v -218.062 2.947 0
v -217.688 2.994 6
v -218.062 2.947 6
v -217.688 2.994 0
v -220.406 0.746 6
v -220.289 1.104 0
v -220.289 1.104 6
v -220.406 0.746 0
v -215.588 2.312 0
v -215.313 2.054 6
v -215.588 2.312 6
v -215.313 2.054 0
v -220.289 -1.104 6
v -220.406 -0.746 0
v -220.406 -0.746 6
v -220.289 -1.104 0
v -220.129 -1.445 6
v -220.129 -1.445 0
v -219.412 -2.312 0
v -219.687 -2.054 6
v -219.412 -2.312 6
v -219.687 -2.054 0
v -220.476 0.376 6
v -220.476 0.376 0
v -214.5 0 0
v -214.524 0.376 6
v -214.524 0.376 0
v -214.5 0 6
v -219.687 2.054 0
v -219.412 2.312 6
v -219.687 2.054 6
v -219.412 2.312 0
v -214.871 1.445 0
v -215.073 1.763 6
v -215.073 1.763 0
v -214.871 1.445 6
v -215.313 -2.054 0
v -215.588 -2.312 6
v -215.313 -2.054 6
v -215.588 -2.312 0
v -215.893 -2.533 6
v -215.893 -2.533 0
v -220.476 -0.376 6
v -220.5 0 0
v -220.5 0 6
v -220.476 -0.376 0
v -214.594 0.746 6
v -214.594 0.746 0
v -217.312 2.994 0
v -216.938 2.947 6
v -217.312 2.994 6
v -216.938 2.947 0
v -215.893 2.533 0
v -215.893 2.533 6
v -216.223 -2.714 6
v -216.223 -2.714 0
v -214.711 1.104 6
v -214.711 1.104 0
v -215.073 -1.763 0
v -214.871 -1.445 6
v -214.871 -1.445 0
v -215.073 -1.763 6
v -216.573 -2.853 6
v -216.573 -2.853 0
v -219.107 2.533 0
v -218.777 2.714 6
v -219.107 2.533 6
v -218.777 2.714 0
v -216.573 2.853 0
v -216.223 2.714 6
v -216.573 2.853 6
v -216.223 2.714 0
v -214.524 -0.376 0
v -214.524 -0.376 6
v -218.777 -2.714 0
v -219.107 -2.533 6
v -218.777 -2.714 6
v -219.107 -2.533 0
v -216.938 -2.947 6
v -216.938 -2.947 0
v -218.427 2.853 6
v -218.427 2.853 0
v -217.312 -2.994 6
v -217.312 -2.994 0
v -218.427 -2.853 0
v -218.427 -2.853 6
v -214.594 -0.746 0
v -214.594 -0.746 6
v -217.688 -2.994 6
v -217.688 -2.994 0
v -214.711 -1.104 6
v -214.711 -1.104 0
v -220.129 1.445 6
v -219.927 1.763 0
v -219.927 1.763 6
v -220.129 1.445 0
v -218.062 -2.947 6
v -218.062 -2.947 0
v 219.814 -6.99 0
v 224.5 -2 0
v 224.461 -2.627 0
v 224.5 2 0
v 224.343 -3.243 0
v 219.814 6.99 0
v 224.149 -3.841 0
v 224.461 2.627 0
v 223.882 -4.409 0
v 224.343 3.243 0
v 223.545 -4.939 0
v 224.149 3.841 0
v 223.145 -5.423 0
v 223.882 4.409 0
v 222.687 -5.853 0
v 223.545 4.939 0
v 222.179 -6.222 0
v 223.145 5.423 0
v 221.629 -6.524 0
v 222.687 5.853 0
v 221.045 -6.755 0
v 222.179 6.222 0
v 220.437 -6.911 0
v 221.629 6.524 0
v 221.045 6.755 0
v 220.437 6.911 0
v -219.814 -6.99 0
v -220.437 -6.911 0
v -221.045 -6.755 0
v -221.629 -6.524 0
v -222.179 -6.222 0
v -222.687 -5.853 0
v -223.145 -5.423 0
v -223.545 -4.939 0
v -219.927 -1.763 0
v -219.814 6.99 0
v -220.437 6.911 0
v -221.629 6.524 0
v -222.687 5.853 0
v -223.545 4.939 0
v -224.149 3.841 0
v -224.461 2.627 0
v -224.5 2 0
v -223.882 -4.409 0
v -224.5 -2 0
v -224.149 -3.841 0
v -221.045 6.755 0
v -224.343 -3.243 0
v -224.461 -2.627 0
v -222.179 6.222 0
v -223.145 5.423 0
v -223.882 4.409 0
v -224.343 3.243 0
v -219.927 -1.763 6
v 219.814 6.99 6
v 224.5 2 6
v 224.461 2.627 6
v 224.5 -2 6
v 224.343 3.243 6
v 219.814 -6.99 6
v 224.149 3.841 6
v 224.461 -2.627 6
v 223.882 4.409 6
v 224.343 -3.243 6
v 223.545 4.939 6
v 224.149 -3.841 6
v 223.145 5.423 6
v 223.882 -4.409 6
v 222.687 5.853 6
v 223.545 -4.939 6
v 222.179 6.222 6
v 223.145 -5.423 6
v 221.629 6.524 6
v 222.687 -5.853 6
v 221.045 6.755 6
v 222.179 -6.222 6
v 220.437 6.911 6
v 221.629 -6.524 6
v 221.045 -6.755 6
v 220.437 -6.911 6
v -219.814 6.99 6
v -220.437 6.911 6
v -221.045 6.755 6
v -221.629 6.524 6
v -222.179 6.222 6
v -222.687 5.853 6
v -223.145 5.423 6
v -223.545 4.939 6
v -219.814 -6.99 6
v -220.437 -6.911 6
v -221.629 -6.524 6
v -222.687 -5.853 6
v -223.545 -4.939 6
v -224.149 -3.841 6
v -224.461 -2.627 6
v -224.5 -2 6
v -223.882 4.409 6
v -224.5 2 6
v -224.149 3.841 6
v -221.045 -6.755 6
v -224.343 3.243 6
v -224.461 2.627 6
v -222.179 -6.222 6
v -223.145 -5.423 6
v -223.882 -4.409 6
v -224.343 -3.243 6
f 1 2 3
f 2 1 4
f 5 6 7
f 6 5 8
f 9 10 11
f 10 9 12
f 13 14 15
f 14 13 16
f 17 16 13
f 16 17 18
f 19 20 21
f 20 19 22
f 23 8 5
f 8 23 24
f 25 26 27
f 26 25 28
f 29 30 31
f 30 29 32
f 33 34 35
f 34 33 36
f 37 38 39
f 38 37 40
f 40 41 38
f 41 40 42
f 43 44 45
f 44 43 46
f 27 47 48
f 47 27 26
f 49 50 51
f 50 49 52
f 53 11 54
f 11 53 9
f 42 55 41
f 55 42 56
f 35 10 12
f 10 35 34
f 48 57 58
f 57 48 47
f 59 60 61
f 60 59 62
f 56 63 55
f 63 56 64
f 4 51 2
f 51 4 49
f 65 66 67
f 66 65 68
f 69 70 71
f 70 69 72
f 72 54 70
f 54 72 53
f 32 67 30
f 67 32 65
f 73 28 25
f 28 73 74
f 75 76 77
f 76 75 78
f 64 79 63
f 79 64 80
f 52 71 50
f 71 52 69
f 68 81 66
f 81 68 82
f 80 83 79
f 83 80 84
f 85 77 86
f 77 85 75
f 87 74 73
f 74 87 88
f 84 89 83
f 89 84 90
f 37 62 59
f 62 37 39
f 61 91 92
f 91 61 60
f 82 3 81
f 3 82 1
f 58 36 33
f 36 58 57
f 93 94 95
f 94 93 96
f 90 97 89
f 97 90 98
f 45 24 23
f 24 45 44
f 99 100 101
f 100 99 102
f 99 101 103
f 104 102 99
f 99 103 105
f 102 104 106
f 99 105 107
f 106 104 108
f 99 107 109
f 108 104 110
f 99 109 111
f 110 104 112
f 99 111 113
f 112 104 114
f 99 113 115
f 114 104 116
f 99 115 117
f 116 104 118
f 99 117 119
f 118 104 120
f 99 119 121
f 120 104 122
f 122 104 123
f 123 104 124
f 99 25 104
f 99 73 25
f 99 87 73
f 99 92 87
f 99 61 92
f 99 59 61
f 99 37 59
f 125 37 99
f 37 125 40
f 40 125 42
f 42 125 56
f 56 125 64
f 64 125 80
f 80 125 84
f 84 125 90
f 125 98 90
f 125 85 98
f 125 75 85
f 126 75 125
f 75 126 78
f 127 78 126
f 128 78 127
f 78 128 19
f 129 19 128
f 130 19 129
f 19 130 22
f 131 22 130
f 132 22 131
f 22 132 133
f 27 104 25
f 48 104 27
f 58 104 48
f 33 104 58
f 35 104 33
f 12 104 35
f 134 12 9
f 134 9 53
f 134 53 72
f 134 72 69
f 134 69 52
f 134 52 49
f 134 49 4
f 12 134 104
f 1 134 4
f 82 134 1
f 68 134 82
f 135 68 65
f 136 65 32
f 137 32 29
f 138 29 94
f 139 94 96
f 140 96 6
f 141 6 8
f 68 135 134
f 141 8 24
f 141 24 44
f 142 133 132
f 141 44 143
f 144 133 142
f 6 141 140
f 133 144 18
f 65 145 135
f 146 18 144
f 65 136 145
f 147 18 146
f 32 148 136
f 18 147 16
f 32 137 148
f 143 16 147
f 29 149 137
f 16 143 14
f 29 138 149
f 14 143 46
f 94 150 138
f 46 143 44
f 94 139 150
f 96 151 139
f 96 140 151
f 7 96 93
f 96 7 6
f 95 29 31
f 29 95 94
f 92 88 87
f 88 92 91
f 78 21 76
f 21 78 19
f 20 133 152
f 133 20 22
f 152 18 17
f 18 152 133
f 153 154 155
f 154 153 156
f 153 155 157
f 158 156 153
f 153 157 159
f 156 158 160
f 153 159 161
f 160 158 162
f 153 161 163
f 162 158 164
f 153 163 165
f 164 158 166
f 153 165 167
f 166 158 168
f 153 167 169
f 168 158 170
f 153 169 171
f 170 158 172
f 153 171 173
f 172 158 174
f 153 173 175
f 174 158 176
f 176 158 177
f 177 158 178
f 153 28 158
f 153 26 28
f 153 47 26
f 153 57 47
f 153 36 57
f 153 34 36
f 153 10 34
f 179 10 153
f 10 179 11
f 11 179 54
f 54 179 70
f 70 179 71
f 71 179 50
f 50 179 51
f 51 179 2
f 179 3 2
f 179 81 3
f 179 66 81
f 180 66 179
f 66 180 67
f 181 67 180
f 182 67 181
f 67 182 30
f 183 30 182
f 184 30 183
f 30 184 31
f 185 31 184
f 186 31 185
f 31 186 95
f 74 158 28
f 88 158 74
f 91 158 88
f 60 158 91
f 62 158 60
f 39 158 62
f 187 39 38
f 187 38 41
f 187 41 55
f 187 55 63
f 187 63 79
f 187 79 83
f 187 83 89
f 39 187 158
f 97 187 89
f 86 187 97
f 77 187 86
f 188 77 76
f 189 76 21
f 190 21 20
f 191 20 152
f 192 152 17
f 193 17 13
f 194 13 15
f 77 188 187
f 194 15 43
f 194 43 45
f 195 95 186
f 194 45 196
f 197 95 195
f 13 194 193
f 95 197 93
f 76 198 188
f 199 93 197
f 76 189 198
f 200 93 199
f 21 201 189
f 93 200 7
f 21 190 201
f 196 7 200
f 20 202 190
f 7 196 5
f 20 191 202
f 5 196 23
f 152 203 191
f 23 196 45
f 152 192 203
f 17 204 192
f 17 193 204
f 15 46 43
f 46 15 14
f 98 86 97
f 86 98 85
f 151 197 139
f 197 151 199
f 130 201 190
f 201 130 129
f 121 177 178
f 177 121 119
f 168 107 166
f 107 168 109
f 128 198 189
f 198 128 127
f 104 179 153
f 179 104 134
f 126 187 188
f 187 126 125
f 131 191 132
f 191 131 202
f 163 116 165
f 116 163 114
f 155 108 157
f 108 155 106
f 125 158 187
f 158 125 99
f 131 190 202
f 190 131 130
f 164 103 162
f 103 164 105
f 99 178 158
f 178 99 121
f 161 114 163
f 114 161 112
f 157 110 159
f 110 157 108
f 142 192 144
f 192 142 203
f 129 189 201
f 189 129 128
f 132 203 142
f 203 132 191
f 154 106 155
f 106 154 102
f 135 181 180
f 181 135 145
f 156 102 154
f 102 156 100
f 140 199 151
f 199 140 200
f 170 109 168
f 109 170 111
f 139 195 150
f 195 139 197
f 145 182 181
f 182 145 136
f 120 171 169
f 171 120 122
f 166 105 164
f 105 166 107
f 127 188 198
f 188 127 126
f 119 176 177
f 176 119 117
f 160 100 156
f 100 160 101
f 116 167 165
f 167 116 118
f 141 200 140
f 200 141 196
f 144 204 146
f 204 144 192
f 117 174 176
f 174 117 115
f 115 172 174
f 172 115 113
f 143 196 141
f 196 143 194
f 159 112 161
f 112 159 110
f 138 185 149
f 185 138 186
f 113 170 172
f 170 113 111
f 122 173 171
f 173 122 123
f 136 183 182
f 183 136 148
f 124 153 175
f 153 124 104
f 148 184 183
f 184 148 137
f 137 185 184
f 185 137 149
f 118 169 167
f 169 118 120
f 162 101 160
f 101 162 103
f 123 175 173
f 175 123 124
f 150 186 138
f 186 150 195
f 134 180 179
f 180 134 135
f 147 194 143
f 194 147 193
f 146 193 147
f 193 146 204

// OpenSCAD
$fn = 50;


difference() {
	union() {
		hull() {
			translate(v = [-219.5000000000, 2.0000000000, 0]) {
				cylinder(h = 6, r = 5);
			}
			translate(v = [219.5000000000, 2.0000000000, 0]) {
				cylinder(h = 6, r = 5);
			}
			translate(v = [-219.5000000000, -2.0000000000, 0]) {
				cylinder(h = 6, r = 5);
			}
			translate(v = [219.5000000000, -2.0000000000, 0]) {
				cylinder(h = 6, r = 5);
			}
		}
	}
	union() {
		translate(v = [-217.5000000000, 0.0000000000, 0]) {
			cylinder(h = 6, r = 3.0000000000);
		}
		translate(v = [-217.5000000000, 0.0000000000, 0]) {
			cylinder(h = 6, r = 1.5000000000);
		}
		translate(v = [-217.5000000000, 0.0000000000, 0]) {
			cylinder(h = 6, r = 1.5000000000);
		}
		translate(v = [-217.5000000000, 0.0000000000, 0]) {
			cylinder(h = 6, r = 1.5000000000);
		}
	}
}
